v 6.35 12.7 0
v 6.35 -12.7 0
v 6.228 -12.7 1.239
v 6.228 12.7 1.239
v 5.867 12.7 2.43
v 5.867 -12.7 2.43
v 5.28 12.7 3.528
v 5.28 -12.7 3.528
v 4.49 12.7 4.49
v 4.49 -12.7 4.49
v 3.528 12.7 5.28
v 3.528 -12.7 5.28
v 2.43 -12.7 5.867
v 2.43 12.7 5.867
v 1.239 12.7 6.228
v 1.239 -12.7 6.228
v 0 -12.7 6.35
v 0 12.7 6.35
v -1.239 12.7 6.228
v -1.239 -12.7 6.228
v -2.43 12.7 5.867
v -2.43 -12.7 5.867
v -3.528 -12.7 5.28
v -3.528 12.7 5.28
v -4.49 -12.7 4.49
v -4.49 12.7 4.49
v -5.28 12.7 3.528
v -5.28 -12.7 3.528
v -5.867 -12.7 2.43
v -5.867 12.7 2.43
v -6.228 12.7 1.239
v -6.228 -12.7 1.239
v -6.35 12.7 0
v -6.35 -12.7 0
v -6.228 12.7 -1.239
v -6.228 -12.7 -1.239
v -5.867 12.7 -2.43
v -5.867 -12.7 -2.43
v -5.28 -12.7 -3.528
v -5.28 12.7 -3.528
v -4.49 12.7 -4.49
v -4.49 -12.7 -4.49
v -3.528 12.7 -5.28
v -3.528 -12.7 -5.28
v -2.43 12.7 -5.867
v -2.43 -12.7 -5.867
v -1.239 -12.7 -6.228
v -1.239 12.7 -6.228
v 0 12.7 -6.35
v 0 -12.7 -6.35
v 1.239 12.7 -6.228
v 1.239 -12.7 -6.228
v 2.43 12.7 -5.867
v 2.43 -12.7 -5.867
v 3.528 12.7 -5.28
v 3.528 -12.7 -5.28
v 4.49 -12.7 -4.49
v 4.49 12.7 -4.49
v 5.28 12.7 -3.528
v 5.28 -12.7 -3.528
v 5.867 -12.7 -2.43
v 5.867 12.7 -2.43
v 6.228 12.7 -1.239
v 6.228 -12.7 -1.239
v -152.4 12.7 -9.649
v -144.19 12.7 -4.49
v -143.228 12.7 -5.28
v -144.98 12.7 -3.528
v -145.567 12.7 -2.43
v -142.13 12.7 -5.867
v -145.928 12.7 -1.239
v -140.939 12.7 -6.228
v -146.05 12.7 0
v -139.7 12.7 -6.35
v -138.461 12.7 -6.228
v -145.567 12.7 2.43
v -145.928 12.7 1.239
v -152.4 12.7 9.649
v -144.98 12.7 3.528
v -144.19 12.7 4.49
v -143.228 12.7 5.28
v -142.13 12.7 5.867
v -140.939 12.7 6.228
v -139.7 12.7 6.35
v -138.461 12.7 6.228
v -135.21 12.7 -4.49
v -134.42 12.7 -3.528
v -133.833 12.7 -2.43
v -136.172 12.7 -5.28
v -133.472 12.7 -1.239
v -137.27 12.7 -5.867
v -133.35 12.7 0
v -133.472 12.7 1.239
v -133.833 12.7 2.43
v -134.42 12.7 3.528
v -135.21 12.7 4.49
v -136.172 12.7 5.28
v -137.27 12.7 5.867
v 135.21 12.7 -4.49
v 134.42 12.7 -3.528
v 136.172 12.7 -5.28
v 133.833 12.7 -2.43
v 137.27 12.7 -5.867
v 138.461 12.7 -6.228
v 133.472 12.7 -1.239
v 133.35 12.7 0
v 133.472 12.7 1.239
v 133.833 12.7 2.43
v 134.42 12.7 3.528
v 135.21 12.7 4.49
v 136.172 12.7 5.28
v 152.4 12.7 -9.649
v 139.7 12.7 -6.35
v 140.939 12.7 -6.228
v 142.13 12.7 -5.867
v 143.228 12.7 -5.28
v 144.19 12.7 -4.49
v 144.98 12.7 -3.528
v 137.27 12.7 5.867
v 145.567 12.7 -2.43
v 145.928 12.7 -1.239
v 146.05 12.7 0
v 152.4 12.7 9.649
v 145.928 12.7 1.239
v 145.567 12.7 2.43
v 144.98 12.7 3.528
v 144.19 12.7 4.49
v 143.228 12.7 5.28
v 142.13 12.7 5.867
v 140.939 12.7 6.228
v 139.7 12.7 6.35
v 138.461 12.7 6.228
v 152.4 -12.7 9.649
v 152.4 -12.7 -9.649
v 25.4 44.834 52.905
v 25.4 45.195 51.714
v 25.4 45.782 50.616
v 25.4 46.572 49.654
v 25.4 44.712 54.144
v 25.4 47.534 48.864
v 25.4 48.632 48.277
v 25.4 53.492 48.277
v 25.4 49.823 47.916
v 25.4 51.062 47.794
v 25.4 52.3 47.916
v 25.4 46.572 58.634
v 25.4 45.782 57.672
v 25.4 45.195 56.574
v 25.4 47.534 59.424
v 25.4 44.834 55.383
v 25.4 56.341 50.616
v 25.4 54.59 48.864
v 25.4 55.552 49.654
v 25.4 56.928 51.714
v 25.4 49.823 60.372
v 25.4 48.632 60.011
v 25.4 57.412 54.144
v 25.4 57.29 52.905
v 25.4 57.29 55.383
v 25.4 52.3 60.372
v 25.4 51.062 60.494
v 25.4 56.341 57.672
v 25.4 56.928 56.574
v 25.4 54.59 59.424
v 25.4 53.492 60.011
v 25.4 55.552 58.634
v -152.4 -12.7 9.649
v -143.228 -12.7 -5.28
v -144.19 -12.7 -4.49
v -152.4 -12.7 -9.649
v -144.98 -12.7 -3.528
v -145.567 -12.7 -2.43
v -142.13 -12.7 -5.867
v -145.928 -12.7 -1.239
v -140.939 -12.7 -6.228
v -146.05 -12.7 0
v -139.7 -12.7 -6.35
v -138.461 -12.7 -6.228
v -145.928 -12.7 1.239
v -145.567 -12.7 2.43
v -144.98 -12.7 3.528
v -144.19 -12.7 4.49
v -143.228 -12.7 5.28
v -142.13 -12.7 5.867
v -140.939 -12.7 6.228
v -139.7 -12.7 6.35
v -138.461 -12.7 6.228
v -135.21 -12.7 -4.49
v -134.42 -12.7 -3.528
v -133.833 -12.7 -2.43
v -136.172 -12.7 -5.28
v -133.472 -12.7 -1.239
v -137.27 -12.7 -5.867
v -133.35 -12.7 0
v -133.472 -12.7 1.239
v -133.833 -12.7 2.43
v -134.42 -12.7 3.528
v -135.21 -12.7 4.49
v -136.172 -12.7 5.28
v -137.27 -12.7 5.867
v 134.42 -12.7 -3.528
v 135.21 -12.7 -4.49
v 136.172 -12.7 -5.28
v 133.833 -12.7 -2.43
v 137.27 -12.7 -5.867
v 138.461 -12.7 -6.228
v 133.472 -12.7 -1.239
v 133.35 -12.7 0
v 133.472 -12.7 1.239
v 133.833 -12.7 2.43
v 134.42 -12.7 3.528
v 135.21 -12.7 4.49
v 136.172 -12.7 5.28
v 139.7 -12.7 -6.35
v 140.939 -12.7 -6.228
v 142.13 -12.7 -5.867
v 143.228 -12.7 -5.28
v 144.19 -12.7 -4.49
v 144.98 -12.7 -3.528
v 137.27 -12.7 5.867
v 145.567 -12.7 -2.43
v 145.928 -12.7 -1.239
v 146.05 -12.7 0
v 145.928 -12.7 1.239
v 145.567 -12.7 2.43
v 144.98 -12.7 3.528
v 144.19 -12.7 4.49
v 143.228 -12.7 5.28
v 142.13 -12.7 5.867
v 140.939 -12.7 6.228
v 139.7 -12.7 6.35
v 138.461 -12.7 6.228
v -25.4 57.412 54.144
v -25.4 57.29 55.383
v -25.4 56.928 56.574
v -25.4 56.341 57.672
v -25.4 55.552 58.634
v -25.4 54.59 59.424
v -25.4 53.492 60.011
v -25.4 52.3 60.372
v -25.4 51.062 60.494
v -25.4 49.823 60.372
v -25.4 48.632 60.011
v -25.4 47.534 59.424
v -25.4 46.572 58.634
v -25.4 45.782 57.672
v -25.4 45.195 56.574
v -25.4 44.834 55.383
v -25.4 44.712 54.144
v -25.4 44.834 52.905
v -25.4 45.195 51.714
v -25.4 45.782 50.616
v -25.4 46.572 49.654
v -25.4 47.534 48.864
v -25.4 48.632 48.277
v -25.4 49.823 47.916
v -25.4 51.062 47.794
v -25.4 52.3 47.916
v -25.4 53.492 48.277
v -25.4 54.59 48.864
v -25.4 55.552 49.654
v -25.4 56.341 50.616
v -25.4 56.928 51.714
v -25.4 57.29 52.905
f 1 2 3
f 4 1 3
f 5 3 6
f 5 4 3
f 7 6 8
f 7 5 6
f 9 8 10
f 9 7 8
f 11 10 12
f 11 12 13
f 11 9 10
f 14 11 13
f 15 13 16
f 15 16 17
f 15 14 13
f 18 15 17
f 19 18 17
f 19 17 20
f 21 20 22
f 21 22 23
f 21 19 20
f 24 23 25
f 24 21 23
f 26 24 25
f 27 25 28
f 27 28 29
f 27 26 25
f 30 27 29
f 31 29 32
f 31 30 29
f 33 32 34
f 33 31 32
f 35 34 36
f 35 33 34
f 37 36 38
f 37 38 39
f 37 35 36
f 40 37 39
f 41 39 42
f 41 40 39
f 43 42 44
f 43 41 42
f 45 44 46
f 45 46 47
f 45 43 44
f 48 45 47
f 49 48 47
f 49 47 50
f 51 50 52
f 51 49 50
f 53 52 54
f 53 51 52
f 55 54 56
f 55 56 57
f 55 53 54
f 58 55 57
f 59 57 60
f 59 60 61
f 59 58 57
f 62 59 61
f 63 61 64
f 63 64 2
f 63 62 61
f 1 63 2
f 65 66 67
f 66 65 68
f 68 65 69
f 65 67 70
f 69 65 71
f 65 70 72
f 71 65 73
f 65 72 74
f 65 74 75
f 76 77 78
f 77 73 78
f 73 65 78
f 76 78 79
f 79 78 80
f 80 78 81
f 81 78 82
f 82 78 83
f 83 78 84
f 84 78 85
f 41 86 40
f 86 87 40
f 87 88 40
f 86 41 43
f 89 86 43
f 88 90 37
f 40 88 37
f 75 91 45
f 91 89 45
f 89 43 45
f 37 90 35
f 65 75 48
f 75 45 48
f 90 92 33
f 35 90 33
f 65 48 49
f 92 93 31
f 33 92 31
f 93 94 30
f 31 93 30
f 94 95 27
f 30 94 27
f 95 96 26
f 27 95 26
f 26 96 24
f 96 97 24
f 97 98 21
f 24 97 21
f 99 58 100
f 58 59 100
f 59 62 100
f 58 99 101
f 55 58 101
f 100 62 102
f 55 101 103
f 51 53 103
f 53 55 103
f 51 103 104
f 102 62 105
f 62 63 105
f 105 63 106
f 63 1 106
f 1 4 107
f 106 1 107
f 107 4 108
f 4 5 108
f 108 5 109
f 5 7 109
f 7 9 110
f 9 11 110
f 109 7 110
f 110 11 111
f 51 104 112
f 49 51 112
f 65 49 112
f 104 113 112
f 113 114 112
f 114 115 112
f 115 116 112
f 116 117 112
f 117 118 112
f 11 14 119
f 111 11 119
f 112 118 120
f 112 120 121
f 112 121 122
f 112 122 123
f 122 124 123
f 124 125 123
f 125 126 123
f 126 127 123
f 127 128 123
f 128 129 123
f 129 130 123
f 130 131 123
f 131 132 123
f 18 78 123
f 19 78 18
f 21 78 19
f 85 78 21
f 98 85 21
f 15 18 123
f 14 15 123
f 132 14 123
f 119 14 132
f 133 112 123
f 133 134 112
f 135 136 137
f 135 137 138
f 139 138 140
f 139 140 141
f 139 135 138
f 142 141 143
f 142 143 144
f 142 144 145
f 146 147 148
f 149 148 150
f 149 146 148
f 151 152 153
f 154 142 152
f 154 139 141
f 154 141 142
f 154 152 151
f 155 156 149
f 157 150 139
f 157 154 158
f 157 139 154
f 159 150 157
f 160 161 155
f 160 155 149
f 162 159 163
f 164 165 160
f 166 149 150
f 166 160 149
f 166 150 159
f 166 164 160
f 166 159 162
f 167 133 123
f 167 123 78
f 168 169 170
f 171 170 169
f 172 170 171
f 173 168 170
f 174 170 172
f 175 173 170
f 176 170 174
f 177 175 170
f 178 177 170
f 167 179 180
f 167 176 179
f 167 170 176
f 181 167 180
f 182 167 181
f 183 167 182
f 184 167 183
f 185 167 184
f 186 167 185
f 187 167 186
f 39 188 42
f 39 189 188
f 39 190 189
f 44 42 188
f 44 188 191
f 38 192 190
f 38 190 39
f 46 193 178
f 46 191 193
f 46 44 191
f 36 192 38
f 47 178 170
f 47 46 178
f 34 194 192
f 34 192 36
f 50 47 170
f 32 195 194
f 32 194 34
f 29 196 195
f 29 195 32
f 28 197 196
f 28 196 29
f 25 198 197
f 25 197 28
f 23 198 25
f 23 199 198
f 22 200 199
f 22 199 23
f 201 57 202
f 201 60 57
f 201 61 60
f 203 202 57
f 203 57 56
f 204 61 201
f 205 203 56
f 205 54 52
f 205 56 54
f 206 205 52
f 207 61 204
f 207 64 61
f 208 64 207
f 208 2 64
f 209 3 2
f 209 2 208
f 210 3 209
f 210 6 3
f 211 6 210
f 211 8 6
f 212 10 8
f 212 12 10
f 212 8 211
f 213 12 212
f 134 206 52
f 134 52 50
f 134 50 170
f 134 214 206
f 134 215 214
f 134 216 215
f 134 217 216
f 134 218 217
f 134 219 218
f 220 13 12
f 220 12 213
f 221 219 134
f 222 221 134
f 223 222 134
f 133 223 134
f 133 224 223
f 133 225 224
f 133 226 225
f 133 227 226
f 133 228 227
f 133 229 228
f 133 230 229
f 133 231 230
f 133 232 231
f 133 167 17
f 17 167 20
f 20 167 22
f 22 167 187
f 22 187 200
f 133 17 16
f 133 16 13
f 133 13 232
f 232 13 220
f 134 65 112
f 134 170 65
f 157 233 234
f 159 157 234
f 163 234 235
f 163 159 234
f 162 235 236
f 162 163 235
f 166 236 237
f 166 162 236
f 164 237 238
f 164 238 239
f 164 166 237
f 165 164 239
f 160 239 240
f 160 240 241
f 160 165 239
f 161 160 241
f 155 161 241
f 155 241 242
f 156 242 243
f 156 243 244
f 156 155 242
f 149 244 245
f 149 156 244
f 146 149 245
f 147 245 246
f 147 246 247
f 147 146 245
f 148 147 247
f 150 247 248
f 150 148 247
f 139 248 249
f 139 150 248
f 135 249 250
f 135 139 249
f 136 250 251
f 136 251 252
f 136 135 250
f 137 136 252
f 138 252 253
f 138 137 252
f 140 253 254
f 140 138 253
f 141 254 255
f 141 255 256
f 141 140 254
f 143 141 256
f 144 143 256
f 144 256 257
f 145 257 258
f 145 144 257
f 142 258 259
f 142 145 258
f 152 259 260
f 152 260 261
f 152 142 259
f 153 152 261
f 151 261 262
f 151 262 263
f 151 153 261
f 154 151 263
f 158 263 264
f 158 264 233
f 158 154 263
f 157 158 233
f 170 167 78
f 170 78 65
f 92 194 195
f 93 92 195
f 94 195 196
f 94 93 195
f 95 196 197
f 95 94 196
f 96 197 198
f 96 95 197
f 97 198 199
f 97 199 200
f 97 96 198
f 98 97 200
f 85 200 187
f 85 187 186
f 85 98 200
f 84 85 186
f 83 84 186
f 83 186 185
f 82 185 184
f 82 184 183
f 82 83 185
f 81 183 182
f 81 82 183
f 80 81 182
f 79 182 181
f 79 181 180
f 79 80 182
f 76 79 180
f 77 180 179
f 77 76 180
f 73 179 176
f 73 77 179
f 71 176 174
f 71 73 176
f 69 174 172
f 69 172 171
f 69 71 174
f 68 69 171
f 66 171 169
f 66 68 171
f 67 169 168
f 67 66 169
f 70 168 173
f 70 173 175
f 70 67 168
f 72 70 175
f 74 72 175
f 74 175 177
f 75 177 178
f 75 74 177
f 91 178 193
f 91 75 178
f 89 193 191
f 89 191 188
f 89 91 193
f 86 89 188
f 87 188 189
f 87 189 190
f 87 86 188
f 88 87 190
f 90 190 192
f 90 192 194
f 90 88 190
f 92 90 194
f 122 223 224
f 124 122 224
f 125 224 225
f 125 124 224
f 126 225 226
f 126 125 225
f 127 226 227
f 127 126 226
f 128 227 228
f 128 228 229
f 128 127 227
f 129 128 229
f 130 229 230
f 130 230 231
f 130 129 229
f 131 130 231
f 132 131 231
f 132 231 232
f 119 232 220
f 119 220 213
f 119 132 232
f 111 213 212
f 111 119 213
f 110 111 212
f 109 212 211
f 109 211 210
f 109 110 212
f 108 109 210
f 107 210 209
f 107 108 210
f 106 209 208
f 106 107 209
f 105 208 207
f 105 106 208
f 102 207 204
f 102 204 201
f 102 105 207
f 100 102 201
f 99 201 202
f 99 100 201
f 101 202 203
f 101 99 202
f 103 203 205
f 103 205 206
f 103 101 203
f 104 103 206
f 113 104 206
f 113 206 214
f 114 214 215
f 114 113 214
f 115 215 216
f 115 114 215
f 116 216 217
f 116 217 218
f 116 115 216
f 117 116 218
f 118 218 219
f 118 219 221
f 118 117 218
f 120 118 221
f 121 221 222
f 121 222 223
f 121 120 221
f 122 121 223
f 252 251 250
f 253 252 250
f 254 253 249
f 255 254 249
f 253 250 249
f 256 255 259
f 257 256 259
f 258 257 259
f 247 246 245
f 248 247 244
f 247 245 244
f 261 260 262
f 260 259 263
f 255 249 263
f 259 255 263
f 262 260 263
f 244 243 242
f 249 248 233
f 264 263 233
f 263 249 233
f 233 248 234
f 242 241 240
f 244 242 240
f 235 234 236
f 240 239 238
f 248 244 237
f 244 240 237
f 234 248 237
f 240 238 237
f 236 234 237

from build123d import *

# Parameters (mm, degrees)
F0_R     = 6.35
F1_DEPTH = 12.7
F2_R     = 6.35
F3_DEPTH = 25.4


with BuildPart() as f1:
    # F0 (on Front) → F1 (new body, symmetric)
    with BuildSketch(Plane.XZ):
        Polygon((152.4, -9.649447), (152.4, 9.649447), (0, 9.649447), (-152.4, 9.649447), (-152.4, -9.649447), align=None)
        with Locations((-139.7, 0)):
            Circle(F0_R, mode=Mode.SUBTRACT)
        Circle(F0_R, mode=Mode.SUBTRACT)
        with Locations((139.7, 0)):
            Circle(F0_R, mode=Mode.SUBTRACT)
    extrude(amount=F1_DEPTH, both=True)


with BuildPart() as f3:
    # F2 (on Right) → F3 (new body, symmetric)
    with BuildSketch(Plane.YZ):
        with Locations((51.06166, 54.144122)):
            Circle(F2_R)
    extrude(amount=F3_DEPTH, both=True)


solid = Compound([f1.part, f3.part])
